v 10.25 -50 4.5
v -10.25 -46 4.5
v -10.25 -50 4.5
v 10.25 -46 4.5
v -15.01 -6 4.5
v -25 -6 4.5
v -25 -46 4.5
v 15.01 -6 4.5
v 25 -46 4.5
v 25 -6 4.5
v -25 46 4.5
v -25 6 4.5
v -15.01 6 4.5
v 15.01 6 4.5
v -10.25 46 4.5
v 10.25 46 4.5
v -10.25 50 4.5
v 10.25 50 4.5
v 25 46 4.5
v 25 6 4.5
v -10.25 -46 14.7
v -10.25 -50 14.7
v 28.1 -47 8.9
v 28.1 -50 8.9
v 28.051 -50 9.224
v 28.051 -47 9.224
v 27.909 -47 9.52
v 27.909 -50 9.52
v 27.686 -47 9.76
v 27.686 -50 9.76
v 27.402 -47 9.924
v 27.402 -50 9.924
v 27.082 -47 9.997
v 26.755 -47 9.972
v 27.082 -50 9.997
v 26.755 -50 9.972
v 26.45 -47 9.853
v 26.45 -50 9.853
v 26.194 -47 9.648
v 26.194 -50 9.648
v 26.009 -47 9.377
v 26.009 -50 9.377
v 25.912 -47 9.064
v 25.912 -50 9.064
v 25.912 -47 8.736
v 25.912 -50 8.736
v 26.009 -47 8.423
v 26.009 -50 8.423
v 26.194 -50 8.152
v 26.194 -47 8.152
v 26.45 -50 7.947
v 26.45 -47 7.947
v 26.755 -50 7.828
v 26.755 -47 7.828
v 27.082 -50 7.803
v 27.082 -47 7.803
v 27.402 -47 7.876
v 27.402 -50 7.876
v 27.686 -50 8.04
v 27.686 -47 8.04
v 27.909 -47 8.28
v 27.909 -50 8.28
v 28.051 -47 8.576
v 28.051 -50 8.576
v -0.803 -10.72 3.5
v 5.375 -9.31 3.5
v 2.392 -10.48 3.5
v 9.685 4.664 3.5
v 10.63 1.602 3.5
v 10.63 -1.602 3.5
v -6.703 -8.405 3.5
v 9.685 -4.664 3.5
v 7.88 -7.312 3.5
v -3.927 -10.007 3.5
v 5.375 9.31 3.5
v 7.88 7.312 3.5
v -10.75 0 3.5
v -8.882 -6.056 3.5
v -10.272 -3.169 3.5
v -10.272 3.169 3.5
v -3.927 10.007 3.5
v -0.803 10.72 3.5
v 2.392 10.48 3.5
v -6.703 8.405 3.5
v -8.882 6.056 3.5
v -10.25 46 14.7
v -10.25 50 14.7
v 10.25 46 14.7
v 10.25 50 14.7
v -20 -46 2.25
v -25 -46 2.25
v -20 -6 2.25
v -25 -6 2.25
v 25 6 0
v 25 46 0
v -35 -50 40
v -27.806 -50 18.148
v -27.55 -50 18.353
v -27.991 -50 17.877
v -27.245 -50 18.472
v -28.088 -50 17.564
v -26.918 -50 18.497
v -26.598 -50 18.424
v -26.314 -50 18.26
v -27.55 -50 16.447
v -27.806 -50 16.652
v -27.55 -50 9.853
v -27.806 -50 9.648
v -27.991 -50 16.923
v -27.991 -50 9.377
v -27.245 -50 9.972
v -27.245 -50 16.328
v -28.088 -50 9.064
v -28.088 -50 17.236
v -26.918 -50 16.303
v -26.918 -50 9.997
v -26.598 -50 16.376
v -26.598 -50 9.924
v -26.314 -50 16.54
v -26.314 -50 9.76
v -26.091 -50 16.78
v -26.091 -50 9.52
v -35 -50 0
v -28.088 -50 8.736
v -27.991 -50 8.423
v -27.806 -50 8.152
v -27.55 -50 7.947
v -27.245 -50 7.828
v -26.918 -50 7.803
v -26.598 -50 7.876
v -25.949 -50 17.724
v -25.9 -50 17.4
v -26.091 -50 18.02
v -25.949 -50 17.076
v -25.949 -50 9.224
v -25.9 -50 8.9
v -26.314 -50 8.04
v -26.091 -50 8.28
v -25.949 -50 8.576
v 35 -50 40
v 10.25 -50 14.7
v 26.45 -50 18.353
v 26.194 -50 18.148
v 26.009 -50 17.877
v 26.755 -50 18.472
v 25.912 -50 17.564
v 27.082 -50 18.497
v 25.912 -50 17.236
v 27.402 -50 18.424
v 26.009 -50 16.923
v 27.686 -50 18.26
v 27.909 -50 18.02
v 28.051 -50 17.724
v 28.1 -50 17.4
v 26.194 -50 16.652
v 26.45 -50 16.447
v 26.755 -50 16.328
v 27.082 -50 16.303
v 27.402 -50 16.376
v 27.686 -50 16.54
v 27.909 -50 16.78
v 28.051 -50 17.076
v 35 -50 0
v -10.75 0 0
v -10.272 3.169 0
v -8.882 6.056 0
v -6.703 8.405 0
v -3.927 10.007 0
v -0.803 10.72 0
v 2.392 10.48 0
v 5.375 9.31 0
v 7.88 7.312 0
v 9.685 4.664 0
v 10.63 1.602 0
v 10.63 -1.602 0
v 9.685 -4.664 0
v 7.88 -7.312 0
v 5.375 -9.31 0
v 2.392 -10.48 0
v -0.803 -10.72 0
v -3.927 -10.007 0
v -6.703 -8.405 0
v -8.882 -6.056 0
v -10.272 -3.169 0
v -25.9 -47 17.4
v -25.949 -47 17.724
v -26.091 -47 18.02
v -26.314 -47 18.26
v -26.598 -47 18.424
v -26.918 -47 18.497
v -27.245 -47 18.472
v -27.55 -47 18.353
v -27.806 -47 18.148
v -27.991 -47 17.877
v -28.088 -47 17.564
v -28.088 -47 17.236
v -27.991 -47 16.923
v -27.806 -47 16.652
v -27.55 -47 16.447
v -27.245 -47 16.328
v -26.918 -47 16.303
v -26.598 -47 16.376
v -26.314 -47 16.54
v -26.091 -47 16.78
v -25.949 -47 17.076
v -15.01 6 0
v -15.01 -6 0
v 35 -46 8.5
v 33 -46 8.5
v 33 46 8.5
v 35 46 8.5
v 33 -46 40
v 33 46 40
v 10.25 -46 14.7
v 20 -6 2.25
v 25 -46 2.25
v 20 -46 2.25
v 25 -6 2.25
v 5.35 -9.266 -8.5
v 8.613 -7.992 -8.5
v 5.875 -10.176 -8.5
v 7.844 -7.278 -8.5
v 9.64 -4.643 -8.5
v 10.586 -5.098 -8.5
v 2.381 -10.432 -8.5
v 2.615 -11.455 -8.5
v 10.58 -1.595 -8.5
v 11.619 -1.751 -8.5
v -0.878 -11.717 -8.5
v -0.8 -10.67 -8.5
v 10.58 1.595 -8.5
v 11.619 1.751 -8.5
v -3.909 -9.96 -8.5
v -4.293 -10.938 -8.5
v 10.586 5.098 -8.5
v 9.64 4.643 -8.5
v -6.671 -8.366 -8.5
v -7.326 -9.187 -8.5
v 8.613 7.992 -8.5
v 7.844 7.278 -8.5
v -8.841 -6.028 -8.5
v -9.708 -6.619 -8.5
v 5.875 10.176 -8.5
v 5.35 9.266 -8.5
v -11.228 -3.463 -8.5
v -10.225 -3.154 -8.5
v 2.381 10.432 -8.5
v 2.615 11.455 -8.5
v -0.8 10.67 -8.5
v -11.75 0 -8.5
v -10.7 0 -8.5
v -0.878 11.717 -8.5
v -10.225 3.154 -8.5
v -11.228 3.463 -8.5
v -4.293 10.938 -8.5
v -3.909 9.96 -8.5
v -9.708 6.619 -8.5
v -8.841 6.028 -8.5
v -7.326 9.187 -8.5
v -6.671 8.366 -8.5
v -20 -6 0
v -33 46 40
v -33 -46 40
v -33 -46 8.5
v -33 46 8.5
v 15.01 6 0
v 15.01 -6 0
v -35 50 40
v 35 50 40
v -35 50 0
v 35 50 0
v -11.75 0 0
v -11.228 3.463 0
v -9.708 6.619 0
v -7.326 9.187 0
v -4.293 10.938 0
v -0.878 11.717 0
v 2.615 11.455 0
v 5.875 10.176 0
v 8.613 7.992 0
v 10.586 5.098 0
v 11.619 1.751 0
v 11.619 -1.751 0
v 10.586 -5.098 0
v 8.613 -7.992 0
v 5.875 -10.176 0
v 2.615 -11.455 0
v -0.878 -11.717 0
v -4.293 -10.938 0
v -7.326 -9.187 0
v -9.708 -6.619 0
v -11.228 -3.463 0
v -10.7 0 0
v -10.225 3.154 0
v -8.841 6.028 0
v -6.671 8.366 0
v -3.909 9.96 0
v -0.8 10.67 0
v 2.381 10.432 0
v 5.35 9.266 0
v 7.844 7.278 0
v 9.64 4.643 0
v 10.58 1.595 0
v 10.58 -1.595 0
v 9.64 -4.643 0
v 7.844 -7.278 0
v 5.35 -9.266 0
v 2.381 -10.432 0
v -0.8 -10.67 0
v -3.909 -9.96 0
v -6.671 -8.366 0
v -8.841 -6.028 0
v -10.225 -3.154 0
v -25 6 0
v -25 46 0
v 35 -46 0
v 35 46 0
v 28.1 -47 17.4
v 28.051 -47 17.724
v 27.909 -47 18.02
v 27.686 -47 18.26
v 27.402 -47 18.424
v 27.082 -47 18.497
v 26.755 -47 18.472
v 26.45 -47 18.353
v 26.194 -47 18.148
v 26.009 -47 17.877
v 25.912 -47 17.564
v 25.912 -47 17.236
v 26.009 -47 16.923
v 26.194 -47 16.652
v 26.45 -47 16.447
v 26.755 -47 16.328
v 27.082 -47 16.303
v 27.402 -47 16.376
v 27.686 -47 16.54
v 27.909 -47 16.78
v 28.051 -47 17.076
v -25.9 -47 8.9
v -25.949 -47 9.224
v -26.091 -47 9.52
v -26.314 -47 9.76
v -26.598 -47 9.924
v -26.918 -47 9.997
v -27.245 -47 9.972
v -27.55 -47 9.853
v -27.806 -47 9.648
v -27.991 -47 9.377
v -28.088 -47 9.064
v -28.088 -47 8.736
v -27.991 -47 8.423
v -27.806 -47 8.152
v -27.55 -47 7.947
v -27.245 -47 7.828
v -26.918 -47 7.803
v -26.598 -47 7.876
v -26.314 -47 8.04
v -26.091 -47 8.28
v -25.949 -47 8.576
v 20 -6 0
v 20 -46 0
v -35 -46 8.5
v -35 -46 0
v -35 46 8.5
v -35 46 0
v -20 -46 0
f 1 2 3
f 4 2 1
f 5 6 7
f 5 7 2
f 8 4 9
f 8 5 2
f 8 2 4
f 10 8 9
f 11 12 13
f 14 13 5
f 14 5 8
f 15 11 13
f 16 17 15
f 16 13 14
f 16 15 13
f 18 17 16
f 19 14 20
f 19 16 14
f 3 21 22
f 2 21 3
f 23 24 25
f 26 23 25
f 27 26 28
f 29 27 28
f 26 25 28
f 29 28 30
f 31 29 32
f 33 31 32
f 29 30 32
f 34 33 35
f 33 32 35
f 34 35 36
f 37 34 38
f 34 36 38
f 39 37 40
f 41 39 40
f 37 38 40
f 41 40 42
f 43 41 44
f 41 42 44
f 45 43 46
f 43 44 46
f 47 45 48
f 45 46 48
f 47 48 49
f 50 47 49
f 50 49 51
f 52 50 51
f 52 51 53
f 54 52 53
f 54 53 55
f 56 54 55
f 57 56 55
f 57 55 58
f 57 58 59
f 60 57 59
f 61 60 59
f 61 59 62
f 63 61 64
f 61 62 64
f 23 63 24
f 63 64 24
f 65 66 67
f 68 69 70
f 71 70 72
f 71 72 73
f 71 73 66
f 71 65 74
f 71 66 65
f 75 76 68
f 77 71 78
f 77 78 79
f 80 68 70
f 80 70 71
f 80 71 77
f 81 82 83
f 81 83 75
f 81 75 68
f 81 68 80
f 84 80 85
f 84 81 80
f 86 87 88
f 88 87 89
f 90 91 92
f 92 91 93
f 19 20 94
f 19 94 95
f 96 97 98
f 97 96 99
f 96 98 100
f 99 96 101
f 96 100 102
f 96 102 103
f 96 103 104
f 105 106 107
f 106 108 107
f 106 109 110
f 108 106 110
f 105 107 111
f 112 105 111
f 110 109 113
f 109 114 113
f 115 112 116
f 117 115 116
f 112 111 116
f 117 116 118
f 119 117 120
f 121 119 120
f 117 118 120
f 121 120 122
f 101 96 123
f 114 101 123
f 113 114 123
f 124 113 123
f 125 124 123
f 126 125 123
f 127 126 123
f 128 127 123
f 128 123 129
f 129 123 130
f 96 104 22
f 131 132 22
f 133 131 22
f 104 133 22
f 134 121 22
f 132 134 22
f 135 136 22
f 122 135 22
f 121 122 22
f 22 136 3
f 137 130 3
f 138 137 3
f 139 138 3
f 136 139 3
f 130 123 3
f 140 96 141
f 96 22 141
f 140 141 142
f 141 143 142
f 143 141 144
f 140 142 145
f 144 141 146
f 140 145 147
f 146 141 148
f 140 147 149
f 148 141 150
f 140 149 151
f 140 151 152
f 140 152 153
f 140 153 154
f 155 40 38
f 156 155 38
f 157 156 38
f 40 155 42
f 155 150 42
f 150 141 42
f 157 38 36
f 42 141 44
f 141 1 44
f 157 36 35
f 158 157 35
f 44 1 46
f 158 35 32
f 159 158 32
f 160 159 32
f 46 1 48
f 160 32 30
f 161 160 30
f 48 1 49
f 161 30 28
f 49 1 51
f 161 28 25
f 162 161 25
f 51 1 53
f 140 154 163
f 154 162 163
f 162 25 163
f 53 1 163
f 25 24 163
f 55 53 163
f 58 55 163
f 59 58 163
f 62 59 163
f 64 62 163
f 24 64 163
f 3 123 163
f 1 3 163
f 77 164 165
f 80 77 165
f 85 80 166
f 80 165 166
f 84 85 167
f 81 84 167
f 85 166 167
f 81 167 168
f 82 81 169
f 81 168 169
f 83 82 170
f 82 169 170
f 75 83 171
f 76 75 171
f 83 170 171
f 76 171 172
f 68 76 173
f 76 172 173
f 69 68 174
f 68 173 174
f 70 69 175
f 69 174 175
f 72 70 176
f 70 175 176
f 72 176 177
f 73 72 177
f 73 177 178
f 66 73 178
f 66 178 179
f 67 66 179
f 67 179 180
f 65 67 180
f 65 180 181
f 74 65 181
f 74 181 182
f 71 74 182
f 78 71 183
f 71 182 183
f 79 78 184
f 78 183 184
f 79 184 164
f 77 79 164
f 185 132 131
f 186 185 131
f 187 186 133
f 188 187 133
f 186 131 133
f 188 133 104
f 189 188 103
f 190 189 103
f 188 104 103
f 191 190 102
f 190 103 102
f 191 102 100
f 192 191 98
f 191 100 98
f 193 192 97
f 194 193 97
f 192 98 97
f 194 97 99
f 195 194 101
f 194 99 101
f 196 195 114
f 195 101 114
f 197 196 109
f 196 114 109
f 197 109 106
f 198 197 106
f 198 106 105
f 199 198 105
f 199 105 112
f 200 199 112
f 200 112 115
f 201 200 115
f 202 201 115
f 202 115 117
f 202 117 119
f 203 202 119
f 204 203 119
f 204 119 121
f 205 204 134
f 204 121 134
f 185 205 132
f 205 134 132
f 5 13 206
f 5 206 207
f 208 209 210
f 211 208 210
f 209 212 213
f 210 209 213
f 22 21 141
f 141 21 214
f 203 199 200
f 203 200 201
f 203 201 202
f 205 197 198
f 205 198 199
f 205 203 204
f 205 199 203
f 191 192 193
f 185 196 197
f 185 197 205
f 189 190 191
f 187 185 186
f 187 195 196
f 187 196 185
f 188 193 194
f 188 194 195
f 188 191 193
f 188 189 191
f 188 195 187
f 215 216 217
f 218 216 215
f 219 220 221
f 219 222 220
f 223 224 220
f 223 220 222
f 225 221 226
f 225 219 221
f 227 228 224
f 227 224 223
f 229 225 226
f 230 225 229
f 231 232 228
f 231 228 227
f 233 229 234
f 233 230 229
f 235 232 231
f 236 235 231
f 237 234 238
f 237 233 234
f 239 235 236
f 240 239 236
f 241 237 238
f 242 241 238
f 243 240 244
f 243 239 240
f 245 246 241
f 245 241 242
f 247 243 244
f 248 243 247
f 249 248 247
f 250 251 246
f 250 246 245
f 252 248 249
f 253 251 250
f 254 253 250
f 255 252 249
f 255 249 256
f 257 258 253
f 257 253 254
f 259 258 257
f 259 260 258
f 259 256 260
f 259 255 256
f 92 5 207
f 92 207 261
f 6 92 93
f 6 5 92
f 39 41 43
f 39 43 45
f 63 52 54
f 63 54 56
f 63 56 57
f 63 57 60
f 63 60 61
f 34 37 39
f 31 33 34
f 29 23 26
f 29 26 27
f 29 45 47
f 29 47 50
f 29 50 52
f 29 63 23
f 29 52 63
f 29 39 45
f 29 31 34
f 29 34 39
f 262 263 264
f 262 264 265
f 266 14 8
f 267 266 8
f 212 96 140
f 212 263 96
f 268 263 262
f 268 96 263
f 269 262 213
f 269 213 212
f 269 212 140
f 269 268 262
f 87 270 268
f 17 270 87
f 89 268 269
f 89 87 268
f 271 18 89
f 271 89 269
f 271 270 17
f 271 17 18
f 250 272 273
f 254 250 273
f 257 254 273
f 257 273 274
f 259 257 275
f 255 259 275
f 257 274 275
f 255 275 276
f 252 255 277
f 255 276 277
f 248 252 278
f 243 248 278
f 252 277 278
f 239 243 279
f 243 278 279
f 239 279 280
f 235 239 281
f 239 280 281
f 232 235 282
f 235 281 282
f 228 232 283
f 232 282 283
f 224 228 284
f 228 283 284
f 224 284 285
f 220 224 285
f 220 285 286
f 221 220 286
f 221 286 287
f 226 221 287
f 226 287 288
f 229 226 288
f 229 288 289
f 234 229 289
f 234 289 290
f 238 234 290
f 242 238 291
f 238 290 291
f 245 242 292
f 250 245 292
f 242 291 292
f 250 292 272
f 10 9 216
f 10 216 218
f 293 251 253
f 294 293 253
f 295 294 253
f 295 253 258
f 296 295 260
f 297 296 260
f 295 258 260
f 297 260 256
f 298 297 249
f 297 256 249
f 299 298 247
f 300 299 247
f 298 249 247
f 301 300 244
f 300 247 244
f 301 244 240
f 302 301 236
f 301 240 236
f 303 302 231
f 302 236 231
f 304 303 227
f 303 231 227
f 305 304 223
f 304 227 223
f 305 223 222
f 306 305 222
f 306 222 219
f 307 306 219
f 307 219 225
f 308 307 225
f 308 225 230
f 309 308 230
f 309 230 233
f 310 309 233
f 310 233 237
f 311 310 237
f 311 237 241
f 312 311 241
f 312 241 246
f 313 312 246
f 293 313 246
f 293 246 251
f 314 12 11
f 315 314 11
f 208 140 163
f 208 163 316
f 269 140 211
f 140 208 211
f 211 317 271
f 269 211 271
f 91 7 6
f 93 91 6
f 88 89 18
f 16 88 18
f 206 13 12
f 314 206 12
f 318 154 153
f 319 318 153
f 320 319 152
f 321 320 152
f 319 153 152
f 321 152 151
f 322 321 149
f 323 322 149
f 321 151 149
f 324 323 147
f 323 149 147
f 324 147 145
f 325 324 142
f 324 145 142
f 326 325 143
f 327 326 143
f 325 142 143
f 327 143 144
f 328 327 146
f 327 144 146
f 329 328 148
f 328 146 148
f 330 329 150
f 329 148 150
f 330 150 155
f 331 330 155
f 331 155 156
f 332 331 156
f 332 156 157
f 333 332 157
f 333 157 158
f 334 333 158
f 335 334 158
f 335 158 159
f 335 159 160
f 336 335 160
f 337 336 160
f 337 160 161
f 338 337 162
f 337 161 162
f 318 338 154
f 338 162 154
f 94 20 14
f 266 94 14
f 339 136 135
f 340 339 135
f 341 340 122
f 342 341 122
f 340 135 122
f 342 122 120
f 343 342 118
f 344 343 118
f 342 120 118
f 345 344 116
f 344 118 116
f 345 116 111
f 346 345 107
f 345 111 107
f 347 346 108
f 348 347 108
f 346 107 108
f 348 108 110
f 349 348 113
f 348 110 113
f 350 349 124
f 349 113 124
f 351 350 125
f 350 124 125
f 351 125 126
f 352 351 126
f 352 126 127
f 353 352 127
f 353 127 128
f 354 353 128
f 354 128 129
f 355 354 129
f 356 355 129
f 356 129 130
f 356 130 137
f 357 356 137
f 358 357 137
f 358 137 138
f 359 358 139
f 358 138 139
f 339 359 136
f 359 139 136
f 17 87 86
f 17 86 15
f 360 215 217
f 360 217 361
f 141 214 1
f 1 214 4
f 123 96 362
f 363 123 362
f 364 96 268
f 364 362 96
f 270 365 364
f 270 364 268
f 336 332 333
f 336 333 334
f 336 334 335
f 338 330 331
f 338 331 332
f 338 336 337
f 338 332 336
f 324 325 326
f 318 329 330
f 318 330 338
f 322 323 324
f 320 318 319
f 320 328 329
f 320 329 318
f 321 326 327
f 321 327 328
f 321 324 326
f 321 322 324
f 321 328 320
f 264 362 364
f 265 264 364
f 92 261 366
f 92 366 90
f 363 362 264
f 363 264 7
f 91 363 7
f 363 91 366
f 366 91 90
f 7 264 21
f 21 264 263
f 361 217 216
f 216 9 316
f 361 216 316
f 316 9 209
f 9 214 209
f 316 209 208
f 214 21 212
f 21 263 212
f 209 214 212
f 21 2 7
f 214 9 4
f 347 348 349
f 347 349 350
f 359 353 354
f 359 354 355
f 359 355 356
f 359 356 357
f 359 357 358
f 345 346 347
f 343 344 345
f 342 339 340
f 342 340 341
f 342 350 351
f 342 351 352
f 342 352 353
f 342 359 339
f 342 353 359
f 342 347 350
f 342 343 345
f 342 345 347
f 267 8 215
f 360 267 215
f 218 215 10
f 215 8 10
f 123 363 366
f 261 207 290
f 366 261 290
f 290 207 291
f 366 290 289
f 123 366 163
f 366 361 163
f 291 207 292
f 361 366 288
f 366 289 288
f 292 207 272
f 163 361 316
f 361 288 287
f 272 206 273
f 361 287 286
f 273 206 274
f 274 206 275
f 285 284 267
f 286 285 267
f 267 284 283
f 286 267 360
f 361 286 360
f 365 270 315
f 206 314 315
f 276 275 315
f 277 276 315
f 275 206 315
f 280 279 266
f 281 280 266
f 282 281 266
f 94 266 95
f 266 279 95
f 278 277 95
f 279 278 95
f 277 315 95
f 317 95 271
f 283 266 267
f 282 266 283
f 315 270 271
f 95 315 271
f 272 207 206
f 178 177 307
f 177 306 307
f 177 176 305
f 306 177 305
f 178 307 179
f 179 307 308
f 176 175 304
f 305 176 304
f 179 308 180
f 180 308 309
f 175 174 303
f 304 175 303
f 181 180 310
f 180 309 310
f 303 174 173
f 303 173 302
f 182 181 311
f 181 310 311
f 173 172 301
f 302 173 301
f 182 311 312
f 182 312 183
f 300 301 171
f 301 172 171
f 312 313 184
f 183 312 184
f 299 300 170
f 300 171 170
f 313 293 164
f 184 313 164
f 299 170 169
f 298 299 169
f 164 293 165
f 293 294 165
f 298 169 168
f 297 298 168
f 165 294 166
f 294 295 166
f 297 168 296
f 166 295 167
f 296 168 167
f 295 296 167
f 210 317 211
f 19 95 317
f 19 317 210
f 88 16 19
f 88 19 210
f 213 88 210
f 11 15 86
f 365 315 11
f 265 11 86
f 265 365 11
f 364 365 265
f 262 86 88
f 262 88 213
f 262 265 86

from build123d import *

# Parameters (mm, degrees)
SKETCH1_W           = 70
SKETCH1_H           = 100
BOSS_EXTRUDE1_DEPTH = 40
SKETCH2_W           = 66
SKETCH2_H           = 92
CUT_EXTRUDE1_DEPTH  = 33
SKETCH3_W           = 4
SKETCH3_H           = 92
CUT_EXTRUDE2_DEPTH  = 71
SKETCH4_R           = 10.75
CUT_EXTRUDE3_DEPTH  = 3.5
CUT_EXTRUDE4_DEPTH  = 5.5
SKETCH6_R           = 1.1
CUT_EXTRUDE5_DEPTH  = 3
SKETCH11_W          = 10
SKETCH11_H          = 92
CUT_EXTRUDE9_DEPTH  = 10
SKETCH12_W          = 2.25
SKETCH12_H          = 40
CUT_EXTRUDE10_DEPTH = 5
SKETCH13_W          = 2.25
SKETCH13_H          = 40
CUT_EXTRUDE11_DEPTH = 5
SKETCH16_R          = 11.75
BOSS_EXTRUDE3_DEPTH = 8.5
SKETCH17_R          = 10.7
CUT_EXTRUDE13_DEPTH = 10
SKETCH19_W          = 20.5
SKETCH19_H          = 10.2
CUT_EXTRUDE14_DEPTH = 101


with BuildPart() as part:
    # Sketch1 → Boss-Extrude1 (new body)
    with BuildSketch(Plane.XY):
        Rectangle(SKETCH1_W, SKETCH1_H)
    extrude(amount=BOSS_EXTRUDE1_DEPTH)

    # Sketch2 → Cut-Extrude1 (cut)
    with BuildSketch(Plane.XY.offset(40)):
        Rectangle(SKETCH2_W, SKETCH2_H)
    extrude(amount=-CUT_EXTRUDE1_DEPTH, mode=Mode.SUBTRACT)

    # Sketch3 → Cut-Extrude2 (cut, through all)
    with BuildSketch(Plane.ZY.offset(35)):
        with Locations((6.5, 0)):
            Rectangle(SKETCH3_W, SKETCH3_H)
    extrude(amount=-CUT_EXTRUDE2_DEPTH, mode=Mode.SUBTRACT)

    # Sketch4 → Cut-Extrude3 (cut)
    with BuildSketch(Plane(origin=(0, 0, 0), x_dir=(-1, 0, 0), z_dir=(0, 0, -1))):
        Circle(SKETCH4_R)
    extrude(amount=-CUT_EXTRUDE3_DEPTH, mode=Mode.SUBTRACT)

    # Sketch5 → Cut-Extrude4 (cut, through all)
    with BuildSketch(Plane.XY.offset(4.5)):
        Polygon((-15.010107583, -6), (-35.010107583, -6), (-35.010107583, 6), (-28.010107583, 6), (-22.010107583, 6), (-15.010107583, 6), align=None)
        Polygon((15.010107583, -6), (35.010107583, -6), (35.010107583, 6), (28.010107583, 6), (22.010107583, 6), (15.010107583, 6), align=None)
    extrude(amount=-CUT_EXTRUDE4_DEPTH, mode=Mode.SUBTRACT)

    # Sketch6 → Cut-Extrude5 (cut)
    with BuildSketch(Plane.XZ.offset(50)):
        with Locations((27, 8.9)):
            Circle(SKETCH6_R)
        with Locations((27, 17.4)):
            Circle(SKETCH6_R)
        with Locations((-27, 8.9)):
            Circle(SKETCH6_R)
        with Locations((-27, 17.4)):
            Circle(SKETCH6_R)
    extrude(amount=-CUT_EXTRUDE5_DEPTH, mode=Mode.SUBTRACT)

    # Sketch11 → Cut-Extrude9 (cut)
    with BuildSketch(Plane.XY.offset(4.5)):
        with Locations((-30, 0)):
            Rectangle(SKETCH11_W, SKETCH11_H)
        with Locations((30, 0)):
            Rectangle(SKETCH11_W, SKETCH11_H)
    extrude(amount=-CUT_EXTRUDE9_DEPTH, mode=Mode.SUBTRACT)

    # Sketch12 → Cut-Extrude10 (cut)
    with BuildSketch(Plane(origin=(25, 0, 0), x_dir=(0, 0, -1), z_dir=(1, 0, 0))):
        with Locations((-1.125, -26)):
            Rectangle(SKETCH12_W, SKETCH12_H)
    extrude(amount=-CUT_EXTRUDE10_DEPTH, mode=Mode.SUBTRACT)

    # Sketch13 → Cut-Extrude11 (cut)
    with BuildSketch(Plane.ZY.offset(25)):
        with Locations((1.125, -26)):
            Rectangle(SKETCH13_W, SKETCH13_H)
    extrude(amount=-CUT_EXTRUDE11_DEPTH, mode=Mode.SUBTRACT)

    # Sketch16 → Boss-Extrude3 (add)
    with BuildSketch(Plane(origin=(0, 0, 0), x_dir=(-1, 0, 0), z_dir=(0, 0, -1))):
        Circle(SKETCH16_R)
    extrude(amount=BOSS_EXTRUDE3_DEPTH)

    # Sketch17 → Cut-Extrude13 (cut)
    with BuildSketch(Plane(origin=(0, 0, -8.5), x_dir=(-1, 0, 0), z_dir=(0, 0, -1))):
        Circle(SKETCH17_R)
    extrude(amount=-CUT_EXTRUDE13_DEPTH, mode=Mode.SUBTRACT)

    # Sketch19 → Cut-Extrude14 (cut, through all)
    with BuildSketch(Plane(origin=(0, 50, 0), x_dir=(1, 0, 0), z_dir=(0, 1, 0))):
        with Locations((0, -9.6)):
            Rectangle(SKETCH19_W, SKETCH19_H)
    extrude(amount=-CUT_EXTRUDE14_DEPTH, mode=Mode.SUBTRACT)


solid = part.part
